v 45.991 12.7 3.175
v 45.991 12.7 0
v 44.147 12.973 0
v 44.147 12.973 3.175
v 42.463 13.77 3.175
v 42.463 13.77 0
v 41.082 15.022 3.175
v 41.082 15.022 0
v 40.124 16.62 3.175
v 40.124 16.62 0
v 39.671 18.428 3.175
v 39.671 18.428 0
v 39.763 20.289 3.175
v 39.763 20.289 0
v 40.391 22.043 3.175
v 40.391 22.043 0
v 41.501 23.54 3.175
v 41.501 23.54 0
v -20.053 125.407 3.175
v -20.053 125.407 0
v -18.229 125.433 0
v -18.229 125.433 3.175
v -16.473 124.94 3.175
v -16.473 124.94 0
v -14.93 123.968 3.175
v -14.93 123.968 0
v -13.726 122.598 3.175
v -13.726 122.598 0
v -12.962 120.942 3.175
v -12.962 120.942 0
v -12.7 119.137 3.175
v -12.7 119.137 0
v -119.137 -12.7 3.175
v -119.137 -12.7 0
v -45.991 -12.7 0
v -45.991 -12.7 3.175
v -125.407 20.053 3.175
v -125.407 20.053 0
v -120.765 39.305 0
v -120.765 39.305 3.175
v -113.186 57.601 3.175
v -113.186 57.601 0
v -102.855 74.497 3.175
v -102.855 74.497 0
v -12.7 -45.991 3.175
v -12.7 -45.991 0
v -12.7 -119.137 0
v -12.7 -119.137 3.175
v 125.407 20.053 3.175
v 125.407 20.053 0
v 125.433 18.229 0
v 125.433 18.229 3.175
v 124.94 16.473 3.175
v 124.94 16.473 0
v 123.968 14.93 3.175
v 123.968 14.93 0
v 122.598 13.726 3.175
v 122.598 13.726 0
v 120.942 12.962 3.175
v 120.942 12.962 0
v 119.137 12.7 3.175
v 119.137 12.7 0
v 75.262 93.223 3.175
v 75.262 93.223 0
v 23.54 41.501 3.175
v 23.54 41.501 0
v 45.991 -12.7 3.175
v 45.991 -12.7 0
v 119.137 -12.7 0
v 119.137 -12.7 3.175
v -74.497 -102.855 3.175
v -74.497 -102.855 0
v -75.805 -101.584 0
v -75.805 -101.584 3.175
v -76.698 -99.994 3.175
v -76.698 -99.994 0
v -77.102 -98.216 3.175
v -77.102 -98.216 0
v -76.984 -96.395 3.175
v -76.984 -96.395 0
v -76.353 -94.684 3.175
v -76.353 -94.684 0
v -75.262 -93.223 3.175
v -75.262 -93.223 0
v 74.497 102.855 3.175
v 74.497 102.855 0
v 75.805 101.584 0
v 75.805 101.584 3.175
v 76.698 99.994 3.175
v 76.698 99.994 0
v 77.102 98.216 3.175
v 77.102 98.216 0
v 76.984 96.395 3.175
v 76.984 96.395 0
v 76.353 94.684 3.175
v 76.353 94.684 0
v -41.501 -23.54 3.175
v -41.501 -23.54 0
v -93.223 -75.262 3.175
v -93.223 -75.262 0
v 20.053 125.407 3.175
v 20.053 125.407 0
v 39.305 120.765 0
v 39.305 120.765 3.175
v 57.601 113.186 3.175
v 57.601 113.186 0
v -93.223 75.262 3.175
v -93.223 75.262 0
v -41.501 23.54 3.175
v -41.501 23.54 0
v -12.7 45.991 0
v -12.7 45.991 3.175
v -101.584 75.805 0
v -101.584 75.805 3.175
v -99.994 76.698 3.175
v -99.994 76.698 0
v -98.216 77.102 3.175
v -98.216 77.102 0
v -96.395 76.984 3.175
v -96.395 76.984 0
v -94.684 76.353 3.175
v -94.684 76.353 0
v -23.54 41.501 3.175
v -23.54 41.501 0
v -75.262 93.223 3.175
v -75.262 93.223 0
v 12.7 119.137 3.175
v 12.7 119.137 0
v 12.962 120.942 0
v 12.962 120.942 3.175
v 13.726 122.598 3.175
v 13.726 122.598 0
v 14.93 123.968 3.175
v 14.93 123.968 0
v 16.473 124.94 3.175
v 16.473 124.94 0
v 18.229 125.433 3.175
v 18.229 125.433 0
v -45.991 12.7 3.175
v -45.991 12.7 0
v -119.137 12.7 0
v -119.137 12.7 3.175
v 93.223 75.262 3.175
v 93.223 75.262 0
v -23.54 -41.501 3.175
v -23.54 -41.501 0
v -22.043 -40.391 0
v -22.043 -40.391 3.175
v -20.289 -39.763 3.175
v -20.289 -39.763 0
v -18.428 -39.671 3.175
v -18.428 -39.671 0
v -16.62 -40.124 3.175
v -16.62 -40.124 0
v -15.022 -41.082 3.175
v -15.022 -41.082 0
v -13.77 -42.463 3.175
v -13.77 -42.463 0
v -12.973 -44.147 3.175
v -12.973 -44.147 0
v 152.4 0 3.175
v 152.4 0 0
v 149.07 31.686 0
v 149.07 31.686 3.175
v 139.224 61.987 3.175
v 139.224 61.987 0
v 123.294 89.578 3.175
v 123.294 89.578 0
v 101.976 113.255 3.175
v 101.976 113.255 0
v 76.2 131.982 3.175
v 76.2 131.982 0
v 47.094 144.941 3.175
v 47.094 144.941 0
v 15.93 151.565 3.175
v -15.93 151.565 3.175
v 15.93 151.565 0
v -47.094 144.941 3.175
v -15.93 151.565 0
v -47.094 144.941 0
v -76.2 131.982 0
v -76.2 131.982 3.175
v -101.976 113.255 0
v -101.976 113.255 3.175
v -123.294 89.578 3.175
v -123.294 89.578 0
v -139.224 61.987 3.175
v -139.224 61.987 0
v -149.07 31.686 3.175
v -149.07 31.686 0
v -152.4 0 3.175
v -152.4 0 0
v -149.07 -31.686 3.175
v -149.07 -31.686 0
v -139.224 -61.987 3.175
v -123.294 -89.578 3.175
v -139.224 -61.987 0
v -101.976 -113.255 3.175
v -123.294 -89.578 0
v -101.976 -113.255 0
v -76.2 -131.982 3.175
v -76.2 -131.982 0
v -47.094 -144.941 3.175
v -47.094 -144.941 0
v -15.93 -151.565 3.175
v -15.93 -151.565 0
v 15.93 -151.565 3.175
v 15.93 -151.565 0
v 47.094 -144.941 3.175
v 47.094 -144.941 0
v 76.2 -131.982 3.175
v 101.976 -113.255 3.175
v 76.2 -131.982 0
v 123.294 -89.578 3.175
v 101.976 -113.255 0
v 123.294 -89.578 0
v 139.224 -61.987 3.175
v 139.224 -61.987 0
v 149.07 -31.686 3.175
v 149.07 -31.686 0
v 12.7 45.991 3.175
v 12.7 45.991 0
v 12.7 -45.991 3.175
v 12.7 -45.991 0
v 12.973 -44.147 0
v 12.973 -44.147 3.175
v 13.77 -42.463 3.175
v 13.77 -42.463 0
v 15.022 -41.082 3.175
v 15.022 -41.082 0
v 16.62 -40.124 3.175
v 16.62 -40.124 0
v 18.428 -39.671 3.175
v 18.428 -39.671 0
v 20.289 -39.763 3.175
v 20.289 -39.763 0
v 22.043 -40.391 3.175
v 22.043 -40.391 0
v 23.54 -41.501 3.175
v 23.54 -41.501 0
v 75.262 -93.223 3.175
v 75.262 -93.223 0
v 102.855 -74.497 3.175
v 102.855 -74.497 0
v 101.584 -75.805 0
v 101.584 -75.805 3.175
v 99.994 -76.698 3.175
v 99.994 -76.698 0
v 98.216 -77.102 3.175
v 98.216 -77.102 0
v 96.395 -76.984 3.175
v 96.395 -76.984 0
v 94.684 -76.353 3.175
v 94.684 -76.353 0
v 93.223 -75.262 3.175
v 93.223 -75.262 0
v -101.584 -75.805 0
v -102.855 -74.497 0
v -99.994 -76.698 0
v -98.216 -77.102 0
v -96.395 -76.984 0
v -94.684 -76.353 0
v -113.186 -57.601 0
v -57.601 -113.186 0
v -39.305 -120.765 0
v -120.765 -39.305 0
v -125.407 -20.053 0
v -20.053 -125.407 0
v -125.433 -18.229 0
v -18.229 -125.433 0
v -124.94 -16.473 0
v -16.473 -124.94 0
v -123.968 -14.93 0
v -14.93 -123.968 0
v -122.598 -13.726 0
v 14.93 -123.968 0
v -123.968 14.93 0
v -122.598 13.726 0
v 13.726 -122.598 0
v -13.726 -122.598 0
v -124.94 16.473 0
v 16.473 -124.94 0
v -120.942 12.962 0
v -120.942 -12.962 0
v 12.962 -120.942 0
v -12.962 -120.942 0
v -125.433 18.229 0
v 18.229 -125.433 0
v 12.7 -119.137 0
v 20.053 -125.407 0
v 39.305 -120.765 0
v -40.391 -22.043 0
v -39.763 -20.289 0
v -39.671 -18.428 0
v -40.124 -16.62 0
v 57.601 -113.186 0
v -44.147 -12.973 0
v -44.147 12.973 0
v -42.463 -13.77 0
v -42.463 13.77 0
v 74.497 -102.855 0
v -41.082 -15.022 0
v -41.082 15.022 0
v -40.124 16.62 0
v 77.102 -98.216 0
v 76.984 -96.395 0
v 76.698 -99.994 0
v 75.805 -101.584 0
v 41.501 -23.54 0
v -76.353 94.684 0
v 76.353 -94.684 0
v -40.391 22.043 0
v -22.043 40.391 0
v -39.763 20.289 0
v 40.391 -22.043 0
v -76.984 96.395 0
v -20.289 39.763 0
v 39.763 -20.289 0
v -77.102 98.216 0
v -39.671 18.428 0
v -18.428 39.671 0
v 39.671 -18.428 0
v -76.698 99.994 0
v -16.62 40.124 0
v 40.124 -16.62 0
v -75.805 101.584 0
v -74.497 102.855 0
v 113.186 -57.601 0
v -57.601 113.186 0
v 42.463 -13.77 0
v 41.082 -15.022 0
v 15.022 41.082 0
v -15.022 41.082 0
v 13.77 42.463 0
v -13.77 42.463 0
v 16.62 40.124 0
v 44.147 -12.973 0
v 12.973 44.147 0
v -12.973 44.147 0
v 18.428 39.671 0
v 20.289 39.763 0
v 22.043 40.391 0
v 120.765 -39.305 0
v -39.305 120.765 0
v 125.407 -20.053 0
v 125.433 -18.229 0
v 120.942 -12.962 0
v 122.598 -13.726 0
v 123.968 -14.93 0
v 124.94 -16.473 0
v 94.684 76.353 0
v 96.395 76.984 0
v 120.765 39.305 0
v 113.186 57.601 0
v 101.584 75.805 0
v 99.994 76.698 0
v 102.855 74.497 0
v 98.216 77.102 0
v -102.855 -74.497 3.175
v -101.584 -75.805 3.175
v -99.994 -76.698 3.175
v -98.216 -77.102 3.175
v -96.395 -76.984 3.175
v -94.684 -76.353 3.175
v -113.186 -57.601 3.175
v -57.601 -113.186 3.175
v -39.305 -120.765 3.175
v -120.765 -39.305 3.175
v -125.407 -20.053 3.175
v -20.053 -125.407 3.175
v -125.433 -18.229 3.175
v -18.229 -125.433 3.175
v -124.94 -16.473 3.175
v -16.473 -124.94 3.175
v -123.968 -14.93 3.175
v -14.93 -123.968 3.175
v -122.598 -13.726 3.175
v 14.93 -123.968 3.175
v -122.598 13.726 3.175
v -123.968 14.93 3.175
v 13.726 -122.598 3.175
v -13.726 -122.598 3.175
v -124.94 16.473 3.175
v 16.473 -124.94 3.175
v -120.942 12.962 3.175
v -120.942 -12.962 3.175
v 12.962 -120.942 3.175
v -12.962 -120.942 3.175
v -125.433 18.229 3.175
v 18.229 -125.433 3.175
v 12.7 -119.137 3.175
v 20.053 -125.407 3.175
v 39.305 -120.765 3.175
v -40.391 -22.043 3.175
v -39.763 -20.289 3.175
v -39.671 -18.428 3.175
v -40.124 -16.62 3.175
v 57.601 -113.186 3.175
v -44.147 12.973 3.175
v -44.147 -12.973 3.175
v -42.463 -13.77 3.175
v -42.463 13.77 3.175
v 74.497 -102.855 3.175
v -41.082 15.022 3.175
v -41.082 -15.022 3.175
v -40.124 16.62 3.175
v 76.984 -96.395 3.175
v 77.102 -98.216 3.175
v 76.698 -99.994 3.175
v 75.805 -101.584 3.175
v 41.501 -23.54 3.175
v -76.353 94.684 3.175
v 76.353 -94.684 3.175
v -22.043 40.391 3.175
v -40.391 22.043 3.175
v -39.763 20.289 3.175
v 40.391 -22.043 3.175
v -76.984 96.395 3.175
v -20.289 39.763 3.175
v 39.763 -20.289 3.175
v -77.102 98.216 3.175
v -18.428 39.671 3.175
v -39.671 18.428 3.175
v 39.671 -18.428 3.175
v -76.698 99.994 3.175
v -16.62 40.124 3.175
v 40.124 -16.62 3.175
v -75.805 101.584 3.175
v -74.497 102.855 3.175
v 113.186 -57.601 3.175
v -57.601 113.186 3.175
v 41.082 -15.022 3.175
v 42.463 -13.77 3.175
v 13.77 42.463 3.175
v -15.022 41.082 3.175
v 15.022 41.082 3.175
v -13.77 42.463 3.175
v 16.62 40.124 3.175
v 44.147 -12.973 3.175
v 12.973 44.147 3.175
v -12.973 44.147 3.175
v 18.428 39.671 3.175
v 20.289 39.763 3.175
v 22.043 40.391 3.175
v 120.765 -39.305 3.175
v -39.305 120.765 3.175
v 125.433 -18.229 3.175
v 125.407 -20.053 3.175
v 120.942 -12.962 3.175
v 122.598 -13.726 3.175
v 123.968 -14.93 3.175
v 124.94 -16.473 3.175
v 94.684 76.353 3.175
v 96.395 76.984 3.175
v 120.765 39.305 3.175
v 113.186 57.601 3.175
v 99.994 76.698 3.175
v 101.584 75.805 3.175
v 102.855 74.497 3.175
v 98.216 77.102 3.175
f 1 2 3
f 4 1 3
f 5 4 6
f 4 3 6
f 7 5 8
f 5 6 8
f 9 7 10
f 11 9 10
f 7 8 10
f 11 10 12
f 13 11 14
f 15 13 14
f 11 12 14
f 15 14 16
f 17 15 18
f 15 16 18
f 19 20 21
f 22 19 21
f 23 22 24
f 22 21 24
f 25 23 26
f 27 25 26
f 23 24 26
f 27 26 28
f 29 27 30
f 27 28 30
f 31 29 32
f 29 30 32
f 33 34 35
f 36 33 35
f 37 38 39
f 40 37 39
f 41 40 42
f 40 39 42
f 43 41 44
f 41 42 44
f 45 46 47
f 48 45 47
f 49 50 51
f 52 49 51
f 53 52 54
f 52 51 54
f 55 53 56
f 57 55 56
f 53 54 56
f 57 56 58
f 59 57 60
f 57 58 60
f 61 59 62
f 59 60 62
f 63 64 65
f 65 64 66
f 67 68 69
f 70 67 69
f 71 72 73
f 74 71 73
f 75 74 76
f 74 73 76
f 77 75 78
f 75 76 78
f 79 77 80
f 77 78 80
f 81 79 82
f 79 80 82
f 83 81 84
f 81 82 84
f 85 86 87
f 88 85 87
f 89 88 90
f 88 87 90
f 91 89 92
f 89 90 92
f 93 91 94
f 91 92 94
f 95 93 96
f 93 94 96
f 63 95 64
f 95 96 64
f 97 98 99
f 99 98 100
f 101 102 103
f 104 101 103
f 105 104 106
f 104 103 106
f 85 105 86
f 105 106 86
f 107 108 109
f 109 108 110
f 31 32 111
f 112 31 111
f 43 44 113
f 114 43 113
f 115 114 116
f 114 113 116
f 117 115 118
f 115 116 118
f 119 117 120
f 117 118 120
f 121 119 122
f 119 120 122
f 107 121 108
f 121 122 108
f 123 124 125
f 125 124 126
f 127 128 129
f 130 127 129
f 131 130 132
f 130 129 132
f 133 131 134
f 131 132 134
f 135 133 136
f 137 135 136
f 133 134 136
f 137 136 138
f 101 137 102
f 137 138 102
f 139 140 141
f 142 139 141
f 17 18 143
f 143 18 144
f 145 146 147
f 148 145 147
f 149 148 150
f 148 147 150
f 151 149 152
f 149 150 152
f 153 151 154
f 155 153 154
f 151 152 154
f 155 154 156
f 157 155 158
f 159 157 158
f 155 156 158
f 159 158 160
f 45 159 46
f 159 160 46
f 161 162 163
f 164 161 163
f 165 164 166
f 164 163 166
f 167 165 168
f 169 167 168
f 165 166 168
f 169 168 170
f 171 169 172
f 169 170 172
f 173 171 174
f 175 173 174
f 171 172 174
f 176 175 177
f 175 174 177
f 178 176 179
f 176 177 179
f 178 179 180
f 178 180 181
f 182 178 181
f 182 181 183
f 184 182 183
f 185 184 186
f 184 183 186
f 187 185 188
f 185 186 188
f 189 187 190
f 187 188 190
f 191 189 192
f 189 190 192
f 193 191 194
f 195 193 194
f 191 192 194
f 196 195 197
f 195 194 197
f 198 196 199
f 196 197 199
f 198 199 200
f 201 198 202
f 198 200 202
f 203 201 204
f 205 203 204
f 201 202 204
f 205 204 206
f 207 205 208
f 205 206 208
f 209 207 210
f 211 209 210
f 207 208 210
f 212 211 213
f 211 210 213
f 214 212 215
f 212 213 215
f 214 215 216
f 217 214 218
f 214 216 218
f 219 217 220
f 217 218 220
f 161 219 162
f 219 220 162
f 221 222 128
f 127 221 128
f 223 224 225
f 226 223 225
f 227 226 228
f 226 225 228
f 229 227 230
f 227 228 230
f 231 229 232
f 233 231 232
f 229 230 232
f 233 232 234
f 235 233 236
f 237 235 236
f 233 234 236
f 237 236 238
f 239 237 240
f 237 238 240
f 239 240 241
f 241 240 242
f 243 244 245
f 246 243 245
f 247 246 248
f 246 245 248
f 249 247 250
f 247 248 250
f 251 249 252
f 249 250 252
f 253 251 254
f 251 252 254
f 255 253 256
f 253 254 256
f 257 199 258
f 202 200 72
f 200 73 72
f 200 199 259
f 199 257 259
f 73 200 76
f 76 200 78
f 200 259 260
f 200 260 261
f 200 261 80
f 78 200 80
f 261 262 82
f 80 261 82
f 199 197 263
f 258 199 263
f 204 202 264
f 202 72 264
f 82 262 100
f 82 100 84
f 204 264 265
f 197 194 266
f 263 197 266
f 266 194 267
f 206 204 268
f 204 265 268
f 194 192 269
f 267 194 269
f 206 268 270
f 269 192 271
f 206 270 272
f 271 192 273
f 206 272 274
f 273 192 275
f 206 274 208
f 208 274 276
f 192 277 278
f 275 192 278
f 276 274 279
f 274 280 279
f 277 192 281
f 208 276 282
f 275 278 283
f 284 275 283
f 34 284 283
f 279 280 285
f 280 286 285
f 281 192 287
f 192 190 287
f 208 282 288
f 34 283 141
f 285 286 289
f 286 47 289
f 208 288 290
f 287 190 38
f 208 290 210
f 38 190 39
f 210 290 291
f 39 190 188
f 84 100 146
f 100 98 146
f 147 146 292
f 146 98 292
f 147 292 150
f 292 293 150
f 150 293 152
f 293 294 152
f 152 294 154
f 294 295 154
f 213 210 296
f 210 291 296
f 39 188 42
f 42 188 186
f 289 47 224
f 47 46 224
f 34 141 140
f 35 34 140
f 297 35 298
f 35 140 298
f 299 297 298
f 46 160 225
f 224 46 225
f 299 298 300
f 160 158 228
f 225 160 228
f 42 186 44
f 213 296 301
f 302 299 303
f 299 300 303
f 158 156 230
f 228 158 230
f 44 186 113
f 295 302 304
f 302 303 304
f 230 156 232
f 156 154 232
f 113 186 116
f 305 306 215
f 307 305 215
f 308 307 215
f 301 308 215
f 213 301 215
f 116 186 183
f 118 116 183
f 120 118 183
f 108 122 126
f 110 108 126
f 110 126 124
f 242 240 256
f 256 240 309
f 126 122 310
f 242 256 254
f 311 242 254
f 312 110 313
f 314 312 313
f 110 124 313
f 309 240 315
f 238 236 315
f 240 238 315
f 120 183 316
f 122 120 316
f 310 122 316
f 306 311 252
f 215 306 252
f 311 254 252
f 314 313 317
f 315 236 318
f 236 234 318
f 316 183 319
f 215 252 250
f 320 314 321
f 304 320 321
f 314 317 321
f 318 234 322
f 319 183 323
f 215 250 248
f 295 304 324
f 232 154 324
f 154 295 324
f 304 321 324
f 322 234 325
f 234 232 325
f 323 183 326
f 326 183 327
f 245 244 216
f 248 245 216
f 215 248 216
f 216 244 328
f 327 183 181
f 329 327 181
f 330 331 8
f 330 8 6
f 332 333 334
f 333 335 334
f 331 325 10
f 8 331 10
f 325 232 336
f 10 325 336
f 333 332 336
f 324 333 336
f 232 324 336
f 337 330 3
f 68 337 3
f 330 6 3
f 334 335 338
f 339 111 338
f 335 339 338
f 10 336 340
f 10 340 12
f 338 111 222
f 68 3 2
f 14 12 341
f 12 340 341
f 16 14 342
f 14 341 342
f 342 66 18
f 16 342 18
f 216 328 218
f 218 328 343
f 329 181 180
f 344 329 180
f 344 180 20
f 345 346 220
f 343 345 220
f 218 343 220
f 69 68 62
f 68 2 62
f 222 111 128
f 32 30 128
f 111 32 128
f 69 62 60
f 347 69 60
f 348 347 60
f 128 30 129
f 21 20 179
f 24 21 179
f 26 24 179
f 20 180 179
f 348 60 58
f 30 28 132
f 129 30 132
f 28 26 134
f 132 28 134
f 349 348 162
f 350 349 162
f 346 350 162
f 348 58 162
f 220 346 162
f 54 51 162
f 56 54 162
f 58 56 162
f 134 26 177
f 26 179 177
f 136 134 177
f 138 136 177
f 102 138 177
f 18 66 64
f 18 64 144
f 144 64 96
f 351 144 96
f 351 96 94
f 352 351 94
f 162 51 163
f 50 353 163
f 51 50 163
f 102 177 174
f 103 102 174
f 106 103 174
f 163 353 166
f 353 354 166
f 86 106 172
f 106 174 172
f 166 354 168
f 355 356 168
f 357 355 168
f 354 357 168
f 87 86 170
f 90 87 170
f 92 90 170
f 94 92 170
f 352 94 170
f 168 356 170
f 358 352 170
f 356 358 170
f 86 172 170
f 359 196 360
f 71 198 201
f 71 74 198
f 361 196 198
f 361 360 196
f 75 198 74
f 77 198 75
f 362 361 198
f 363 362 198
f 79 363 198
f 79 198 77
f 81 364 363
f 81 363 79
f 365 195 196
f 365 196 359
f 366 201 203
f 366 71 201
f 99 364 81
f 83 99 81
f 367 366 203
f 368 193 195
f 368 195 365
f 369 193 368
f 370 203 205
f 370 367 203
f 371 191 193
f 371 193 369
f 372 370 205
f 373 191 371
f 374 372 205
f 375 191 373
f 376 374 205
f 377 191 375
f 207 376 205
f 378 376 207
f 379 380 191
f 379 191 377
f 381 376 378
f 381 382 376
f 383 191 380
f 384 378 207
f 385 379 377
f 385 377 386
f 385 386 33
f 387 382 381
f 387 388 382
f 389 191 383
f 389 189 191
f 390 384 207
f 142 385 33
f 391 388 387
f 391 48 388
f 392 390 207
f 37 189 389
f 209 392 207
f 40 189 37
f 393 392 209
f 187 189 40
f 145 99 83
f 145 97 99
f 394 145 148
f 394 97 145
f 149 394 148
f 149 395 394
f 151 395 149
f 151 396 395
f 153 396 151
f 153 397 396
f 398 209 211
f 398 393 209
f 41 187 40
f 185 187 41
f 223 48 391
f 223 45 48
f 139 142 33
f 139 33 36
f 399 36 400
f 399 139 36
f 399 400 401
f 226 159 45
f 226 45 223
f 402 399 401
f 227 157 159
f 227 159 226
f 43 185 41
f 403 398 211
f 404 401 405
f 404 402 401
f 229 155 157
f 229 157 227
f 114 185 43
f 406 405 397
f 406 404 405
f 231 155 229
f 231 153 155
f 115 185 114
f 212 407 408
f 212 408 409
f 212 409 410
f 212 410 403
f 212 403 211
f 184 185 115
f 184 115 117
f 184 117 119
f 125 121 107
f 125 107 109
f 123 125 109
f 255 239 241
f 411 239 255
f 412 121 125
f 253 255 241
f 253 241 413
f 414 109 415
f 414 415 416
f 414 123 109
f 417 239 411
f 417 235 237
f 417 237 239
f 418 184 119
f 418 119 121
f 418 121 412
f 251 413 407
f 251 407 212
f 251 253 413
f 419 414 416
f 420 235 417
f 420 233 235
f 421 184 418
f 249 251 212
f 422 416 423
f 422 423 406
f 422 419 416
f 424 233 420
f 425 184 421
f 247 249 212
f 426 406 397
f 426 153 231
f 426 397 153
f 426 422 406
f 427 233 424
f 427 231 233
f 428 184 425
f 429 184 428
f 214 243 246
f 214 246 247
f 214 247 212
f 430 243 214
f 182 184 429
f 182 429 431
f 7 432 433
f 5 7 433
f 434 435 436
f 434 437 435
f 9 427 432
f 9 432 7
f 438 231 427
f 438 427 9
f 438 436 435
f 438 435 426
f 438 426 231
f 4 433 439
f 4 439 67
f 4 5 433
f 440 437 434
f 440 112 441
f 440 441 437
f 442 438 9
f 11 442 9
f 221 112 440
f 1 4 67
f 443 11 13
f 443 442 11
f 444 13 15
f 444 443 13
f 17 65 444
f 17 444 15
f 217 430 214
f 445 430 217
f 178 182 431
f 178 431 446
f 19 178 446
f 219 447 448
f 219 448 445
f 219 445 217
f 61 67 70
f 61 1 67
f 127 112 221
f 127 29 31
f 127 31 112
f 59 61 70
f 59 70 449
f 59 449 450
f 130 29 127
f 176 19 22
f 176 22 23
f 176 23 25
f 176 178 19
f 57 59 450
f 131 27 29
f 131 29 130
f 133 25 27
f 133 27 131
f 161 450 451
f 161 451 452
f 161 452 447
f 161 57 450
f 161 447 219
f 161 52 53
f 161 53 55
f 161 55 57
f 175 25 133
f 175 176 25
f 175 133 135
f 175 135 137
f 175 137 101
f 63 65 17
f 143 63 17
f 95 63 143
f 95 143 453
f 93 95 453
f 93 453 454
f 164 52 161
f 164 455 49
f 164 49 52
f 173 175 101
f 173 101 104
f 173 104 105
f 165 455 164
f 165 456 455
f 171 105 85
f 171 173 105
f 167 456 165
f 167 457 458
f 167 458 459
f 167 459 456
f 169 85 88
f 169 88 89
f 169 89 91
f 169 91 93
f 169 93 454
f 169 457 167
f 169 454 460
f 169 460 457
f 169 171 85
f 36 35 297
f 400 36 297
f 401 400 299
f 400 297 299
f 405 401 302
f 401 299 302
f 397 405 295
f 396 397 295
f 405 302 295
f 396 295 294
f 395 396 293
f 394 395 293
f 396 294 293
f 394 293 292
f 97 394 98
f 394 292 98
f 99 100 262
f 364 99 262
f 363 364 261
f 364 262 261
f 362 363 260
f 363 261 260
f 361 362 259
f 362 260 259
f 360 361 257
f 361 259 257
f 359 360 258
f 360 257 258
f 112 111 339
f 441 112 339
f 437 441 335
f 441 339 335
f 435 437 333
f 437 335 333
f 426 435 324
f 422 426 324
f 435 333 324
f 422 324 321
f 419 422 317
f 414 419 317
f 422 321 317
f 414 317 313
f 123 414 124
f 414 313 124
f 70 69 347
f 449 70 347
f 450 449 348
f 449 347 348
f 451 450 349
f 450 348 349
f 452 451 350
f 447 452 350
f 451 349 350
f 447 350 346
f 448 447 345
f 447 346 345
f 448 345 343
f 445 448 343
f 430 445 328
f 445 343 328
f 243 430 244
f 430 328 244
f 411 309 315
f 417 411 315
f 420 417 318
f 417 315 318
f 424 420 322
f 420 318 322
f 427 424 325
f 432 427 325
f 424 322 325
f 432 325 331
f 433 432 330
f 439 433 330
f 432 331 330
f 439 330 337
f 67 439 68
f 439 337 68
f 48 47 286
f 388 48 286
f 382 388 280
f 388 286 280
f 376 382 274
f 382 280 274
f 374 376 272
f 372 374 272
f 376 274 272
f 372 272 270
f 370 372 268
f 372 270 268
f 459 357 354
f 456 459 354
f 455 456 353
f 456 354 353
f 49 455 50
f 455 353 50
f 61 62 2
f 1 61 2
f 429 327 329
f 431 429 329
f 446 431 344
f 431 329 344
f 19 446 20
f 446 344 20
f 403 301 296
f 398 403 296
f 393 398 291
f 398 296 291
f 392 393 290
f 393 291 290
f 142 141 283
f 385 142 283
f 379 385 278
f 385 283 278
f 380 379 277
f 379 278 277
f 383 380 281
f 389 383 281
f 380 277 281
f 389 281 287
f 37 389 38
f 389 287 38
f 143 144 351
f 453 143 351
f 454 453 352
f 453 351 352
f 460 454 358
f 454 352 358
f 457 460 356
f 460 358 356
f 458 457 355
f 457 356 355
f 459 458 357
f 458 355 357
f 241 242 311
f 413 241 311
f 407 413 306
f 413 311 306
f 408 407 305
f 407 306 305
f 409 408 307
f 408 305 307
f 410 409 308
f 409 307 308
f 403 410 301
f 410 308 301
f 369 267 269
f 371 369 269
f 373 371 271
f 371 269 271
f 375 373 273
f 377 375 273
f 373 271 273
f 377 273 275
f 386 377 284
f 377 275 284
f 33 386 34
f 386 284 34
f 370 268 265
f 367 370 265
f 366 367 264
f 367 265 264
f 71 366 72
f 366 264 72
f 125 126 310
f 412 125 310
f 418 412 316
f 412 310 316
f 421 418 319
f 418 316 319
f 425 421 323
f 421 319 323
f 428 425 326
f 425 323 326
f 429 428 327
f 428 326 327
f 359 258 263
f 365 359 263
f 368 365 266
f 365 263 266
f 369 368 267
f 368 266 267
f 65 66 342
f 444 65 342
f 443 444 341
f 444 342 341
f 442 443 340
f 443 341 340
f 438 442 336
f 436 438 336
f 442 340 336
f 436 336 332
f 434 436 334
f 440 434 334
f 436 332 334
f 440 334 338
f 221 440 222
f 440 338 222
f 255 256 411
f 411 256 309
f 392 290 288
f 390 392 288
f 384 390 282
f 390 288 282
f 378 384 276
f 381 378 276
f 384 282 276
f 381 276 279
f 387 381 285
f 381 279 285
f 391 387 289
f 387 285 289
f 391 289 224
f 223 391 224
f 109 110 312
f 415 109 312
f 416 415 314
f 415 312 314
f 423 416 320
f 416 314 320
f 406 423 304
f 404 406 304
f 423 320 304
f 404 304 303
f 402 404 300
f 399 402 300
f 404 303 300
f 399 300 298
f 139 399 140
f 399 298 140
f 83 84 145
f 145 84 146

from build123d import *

# Parameters (mm, degrees)
F0_R     = 152.4
F1_DEPTH = 3.175


with BuildPart() as f1:
    # F0 (on Top) → F1 (new body)
    with BuildSketch(Plane.XY):
        Circle(F0_R)
        with BuildLine():
            ThreePointArc((-74.496722, -102.855425), (-77.10194, -98.215549), (-75.262014, -93.222526))
            Line((-75.262014, -93.222526), (-23.540128, -41.50064))
            ThreePointArc((-23.540128, -41.50064), (-16.61996, -40.124133), (-12.7, -45.990768))
            Line((-12.7, -45.990768), (-12.7, -119.13656))
            ThreePointArc((-12.7, -119.13656), (-14.929576, -123.968186), (-20.052632, -125.406906))
            ThreePointArc((-20.052632, -125.406906), (-48.600796, -117.332701), (-74.496722, -102.855425))
        make_face(mode=Mode.SUBTRACT)
        with BuildLine():
            ThreePointArc((-102.855425, -74.496722), (-117.332701, -48.600796), (-125.406906, -20.052632))
            ThreePointArc((-125.406906, -20.052632), (-123.968186, -14.929576), (-119.13656, -12.7))
            Line((-119.13656, -12.7), (-45.990768, -12.7))
            ThreePointArc((-45.990768, -12.7), (-40.124133, -16.61996), (-41.50064, -23.540128))
            Line((-41.50064, -23.540128), (-93.222526, -75.262014))
            ThreePointArc((-93.222526, -75.262014), (-98.215549, -77.10194), (-102.855425, -74.496722))
        make_face(mode=Mode.SUBTRACT)
        with BuildLine():
            ThreePointArc((20.052632, -125.406906), (14.929576, -123.968186), (12.7, -119.13656))
            Line((12.7, -119.13656), (12.7, -45.990768))
            ThreePointArc((12.7, -45.990768), (16.61996, -40.124133), (23.540128, -41.50064))
            Line((23.540128, -41.50064), (75.262014, -93.222526))
            ThreePointArc((75.262014, -93.222526), (77.10194, -98.215549), (74.496722, -102.855425))
            ThreePointArc((74.496722, -102.855425), (48.600796, -117.332701), (20.052632, -125.406906))
        make_face(mode=Mode.SUBTRACT)
        with BuildLine():
            ThreePointArc((119.13656, -12.7), (123.968186, -14.929576), (125.406906, -20.052632))
            ThreePointArc((125.406906, -20.052632), (117.332701, -48.600796), (102.855425, -74.496722))
            ThreePointArc((102.855425, -74.496722), (98.215549, -77.10194), (93.222526, -75.262014))
            Line((93.222526, -75.262014), (41.50064, -23.540128))
            ThreePointArc((41.50064, -23.540128), (40.124133, -16.61996), (45.990768, -12.7))
            Line((45.990768, -12.7), (119.13656, -12.7))
        make_face(mode=Mode.SUBTRACT)
        with BuildLine():
            Line((-45.990768, 12.7), (-119.13656, 12.7))
            ThreePointArc((-119.13656, 12.7), (-123.968186, 14.929576), (-125.406906, 20.052632))
            ThreePointArc((-125.406906, 20.052632), (-117.332701, 48.600796), (-102.855425, 74.496722))
            ThreePointArc((-102.855425, 74.496722), (-98.215549, 77.10194), (-93.222526, 75.262014))
            Line((-93.222526, 75.262014), (-41.50064, 23.540128))
            ThreePointArc((-41.50064, 23.540128), (-40.124133, 16.61996), (-45.990768, 12.7))
        make_face(mode=Mode.SUBTRACT)
        with BuildLine():
            ThreePointArc((-20.052632, 125.406906), (-14.929576, 123.968186), (-12.7, 119.13656))
            Line((-12.7, 119.13656), (-12.7, 45.990768))
            ThreePointArc((-12.7, 45.990768), (-16.61996, 40.124133), (-23.540128, 41.50064))
            Line((-23.540128, 41.50064), (-75.262014, 93.222526))
            ThreePointArc((-75.262014, 93.222526), (-77.10194, 98.215549), (-74.496722, 102.855425))
            ThreePointArc((-74.496722, 102.855425), (-48.600796, 117.332701), (-20.052632, 125.406906))
        make_face(mode=Mode.SUBTRACT)
        with BuildLine():
            ThreePointArc((102.855425, 74.496722), (117.332701, 48.600796), (125.406906, 20.052632))
            ThreePointArc((125.406906, 20.052632), (123.968186, 14.929576), (119.13656, 12.7))
            Line((119.13656, 12.7), (45.990768, 12.7))
            ThreePointArc((45.990768, 12.7), (40.124133, 16.61996), (41.50064, 23.540128))
            Line((41.50064, 23.540128), (93.222526, 75.262014))
            ThreePointArc((93.222526, 75.262014), (98.215549, 77.10194), (102.855425, 74.496722))
        make_face(mode=Mode.SUBTRACT)
        with BuildLine():
            ThreePointArc((74.496722, 102.855425), (77.10194, 98.215549), (75.262014, 93.222526))
            Line((75.262014, 93.222526), (23.540128, 41.50064))
            ThreePointArc((23.540128, 41.50064), (16.61996, 40.124133), (12.7, 45.990768))
            Line((12.7, 45.990768), (12.7, 119.13656))
            ThreePointArc((12.7, 119.13656), (14.929576, 123.968186), (20.052632, 125.406906))
            ThreePointArc((20.052632, 125.406906), (48.600796, 117.332701), (74.496722, 102.855425))
        make_face(mode=Mode.SUBTRACT)
    extrude(amount=F1_DEPTH)


solid = f1.part
